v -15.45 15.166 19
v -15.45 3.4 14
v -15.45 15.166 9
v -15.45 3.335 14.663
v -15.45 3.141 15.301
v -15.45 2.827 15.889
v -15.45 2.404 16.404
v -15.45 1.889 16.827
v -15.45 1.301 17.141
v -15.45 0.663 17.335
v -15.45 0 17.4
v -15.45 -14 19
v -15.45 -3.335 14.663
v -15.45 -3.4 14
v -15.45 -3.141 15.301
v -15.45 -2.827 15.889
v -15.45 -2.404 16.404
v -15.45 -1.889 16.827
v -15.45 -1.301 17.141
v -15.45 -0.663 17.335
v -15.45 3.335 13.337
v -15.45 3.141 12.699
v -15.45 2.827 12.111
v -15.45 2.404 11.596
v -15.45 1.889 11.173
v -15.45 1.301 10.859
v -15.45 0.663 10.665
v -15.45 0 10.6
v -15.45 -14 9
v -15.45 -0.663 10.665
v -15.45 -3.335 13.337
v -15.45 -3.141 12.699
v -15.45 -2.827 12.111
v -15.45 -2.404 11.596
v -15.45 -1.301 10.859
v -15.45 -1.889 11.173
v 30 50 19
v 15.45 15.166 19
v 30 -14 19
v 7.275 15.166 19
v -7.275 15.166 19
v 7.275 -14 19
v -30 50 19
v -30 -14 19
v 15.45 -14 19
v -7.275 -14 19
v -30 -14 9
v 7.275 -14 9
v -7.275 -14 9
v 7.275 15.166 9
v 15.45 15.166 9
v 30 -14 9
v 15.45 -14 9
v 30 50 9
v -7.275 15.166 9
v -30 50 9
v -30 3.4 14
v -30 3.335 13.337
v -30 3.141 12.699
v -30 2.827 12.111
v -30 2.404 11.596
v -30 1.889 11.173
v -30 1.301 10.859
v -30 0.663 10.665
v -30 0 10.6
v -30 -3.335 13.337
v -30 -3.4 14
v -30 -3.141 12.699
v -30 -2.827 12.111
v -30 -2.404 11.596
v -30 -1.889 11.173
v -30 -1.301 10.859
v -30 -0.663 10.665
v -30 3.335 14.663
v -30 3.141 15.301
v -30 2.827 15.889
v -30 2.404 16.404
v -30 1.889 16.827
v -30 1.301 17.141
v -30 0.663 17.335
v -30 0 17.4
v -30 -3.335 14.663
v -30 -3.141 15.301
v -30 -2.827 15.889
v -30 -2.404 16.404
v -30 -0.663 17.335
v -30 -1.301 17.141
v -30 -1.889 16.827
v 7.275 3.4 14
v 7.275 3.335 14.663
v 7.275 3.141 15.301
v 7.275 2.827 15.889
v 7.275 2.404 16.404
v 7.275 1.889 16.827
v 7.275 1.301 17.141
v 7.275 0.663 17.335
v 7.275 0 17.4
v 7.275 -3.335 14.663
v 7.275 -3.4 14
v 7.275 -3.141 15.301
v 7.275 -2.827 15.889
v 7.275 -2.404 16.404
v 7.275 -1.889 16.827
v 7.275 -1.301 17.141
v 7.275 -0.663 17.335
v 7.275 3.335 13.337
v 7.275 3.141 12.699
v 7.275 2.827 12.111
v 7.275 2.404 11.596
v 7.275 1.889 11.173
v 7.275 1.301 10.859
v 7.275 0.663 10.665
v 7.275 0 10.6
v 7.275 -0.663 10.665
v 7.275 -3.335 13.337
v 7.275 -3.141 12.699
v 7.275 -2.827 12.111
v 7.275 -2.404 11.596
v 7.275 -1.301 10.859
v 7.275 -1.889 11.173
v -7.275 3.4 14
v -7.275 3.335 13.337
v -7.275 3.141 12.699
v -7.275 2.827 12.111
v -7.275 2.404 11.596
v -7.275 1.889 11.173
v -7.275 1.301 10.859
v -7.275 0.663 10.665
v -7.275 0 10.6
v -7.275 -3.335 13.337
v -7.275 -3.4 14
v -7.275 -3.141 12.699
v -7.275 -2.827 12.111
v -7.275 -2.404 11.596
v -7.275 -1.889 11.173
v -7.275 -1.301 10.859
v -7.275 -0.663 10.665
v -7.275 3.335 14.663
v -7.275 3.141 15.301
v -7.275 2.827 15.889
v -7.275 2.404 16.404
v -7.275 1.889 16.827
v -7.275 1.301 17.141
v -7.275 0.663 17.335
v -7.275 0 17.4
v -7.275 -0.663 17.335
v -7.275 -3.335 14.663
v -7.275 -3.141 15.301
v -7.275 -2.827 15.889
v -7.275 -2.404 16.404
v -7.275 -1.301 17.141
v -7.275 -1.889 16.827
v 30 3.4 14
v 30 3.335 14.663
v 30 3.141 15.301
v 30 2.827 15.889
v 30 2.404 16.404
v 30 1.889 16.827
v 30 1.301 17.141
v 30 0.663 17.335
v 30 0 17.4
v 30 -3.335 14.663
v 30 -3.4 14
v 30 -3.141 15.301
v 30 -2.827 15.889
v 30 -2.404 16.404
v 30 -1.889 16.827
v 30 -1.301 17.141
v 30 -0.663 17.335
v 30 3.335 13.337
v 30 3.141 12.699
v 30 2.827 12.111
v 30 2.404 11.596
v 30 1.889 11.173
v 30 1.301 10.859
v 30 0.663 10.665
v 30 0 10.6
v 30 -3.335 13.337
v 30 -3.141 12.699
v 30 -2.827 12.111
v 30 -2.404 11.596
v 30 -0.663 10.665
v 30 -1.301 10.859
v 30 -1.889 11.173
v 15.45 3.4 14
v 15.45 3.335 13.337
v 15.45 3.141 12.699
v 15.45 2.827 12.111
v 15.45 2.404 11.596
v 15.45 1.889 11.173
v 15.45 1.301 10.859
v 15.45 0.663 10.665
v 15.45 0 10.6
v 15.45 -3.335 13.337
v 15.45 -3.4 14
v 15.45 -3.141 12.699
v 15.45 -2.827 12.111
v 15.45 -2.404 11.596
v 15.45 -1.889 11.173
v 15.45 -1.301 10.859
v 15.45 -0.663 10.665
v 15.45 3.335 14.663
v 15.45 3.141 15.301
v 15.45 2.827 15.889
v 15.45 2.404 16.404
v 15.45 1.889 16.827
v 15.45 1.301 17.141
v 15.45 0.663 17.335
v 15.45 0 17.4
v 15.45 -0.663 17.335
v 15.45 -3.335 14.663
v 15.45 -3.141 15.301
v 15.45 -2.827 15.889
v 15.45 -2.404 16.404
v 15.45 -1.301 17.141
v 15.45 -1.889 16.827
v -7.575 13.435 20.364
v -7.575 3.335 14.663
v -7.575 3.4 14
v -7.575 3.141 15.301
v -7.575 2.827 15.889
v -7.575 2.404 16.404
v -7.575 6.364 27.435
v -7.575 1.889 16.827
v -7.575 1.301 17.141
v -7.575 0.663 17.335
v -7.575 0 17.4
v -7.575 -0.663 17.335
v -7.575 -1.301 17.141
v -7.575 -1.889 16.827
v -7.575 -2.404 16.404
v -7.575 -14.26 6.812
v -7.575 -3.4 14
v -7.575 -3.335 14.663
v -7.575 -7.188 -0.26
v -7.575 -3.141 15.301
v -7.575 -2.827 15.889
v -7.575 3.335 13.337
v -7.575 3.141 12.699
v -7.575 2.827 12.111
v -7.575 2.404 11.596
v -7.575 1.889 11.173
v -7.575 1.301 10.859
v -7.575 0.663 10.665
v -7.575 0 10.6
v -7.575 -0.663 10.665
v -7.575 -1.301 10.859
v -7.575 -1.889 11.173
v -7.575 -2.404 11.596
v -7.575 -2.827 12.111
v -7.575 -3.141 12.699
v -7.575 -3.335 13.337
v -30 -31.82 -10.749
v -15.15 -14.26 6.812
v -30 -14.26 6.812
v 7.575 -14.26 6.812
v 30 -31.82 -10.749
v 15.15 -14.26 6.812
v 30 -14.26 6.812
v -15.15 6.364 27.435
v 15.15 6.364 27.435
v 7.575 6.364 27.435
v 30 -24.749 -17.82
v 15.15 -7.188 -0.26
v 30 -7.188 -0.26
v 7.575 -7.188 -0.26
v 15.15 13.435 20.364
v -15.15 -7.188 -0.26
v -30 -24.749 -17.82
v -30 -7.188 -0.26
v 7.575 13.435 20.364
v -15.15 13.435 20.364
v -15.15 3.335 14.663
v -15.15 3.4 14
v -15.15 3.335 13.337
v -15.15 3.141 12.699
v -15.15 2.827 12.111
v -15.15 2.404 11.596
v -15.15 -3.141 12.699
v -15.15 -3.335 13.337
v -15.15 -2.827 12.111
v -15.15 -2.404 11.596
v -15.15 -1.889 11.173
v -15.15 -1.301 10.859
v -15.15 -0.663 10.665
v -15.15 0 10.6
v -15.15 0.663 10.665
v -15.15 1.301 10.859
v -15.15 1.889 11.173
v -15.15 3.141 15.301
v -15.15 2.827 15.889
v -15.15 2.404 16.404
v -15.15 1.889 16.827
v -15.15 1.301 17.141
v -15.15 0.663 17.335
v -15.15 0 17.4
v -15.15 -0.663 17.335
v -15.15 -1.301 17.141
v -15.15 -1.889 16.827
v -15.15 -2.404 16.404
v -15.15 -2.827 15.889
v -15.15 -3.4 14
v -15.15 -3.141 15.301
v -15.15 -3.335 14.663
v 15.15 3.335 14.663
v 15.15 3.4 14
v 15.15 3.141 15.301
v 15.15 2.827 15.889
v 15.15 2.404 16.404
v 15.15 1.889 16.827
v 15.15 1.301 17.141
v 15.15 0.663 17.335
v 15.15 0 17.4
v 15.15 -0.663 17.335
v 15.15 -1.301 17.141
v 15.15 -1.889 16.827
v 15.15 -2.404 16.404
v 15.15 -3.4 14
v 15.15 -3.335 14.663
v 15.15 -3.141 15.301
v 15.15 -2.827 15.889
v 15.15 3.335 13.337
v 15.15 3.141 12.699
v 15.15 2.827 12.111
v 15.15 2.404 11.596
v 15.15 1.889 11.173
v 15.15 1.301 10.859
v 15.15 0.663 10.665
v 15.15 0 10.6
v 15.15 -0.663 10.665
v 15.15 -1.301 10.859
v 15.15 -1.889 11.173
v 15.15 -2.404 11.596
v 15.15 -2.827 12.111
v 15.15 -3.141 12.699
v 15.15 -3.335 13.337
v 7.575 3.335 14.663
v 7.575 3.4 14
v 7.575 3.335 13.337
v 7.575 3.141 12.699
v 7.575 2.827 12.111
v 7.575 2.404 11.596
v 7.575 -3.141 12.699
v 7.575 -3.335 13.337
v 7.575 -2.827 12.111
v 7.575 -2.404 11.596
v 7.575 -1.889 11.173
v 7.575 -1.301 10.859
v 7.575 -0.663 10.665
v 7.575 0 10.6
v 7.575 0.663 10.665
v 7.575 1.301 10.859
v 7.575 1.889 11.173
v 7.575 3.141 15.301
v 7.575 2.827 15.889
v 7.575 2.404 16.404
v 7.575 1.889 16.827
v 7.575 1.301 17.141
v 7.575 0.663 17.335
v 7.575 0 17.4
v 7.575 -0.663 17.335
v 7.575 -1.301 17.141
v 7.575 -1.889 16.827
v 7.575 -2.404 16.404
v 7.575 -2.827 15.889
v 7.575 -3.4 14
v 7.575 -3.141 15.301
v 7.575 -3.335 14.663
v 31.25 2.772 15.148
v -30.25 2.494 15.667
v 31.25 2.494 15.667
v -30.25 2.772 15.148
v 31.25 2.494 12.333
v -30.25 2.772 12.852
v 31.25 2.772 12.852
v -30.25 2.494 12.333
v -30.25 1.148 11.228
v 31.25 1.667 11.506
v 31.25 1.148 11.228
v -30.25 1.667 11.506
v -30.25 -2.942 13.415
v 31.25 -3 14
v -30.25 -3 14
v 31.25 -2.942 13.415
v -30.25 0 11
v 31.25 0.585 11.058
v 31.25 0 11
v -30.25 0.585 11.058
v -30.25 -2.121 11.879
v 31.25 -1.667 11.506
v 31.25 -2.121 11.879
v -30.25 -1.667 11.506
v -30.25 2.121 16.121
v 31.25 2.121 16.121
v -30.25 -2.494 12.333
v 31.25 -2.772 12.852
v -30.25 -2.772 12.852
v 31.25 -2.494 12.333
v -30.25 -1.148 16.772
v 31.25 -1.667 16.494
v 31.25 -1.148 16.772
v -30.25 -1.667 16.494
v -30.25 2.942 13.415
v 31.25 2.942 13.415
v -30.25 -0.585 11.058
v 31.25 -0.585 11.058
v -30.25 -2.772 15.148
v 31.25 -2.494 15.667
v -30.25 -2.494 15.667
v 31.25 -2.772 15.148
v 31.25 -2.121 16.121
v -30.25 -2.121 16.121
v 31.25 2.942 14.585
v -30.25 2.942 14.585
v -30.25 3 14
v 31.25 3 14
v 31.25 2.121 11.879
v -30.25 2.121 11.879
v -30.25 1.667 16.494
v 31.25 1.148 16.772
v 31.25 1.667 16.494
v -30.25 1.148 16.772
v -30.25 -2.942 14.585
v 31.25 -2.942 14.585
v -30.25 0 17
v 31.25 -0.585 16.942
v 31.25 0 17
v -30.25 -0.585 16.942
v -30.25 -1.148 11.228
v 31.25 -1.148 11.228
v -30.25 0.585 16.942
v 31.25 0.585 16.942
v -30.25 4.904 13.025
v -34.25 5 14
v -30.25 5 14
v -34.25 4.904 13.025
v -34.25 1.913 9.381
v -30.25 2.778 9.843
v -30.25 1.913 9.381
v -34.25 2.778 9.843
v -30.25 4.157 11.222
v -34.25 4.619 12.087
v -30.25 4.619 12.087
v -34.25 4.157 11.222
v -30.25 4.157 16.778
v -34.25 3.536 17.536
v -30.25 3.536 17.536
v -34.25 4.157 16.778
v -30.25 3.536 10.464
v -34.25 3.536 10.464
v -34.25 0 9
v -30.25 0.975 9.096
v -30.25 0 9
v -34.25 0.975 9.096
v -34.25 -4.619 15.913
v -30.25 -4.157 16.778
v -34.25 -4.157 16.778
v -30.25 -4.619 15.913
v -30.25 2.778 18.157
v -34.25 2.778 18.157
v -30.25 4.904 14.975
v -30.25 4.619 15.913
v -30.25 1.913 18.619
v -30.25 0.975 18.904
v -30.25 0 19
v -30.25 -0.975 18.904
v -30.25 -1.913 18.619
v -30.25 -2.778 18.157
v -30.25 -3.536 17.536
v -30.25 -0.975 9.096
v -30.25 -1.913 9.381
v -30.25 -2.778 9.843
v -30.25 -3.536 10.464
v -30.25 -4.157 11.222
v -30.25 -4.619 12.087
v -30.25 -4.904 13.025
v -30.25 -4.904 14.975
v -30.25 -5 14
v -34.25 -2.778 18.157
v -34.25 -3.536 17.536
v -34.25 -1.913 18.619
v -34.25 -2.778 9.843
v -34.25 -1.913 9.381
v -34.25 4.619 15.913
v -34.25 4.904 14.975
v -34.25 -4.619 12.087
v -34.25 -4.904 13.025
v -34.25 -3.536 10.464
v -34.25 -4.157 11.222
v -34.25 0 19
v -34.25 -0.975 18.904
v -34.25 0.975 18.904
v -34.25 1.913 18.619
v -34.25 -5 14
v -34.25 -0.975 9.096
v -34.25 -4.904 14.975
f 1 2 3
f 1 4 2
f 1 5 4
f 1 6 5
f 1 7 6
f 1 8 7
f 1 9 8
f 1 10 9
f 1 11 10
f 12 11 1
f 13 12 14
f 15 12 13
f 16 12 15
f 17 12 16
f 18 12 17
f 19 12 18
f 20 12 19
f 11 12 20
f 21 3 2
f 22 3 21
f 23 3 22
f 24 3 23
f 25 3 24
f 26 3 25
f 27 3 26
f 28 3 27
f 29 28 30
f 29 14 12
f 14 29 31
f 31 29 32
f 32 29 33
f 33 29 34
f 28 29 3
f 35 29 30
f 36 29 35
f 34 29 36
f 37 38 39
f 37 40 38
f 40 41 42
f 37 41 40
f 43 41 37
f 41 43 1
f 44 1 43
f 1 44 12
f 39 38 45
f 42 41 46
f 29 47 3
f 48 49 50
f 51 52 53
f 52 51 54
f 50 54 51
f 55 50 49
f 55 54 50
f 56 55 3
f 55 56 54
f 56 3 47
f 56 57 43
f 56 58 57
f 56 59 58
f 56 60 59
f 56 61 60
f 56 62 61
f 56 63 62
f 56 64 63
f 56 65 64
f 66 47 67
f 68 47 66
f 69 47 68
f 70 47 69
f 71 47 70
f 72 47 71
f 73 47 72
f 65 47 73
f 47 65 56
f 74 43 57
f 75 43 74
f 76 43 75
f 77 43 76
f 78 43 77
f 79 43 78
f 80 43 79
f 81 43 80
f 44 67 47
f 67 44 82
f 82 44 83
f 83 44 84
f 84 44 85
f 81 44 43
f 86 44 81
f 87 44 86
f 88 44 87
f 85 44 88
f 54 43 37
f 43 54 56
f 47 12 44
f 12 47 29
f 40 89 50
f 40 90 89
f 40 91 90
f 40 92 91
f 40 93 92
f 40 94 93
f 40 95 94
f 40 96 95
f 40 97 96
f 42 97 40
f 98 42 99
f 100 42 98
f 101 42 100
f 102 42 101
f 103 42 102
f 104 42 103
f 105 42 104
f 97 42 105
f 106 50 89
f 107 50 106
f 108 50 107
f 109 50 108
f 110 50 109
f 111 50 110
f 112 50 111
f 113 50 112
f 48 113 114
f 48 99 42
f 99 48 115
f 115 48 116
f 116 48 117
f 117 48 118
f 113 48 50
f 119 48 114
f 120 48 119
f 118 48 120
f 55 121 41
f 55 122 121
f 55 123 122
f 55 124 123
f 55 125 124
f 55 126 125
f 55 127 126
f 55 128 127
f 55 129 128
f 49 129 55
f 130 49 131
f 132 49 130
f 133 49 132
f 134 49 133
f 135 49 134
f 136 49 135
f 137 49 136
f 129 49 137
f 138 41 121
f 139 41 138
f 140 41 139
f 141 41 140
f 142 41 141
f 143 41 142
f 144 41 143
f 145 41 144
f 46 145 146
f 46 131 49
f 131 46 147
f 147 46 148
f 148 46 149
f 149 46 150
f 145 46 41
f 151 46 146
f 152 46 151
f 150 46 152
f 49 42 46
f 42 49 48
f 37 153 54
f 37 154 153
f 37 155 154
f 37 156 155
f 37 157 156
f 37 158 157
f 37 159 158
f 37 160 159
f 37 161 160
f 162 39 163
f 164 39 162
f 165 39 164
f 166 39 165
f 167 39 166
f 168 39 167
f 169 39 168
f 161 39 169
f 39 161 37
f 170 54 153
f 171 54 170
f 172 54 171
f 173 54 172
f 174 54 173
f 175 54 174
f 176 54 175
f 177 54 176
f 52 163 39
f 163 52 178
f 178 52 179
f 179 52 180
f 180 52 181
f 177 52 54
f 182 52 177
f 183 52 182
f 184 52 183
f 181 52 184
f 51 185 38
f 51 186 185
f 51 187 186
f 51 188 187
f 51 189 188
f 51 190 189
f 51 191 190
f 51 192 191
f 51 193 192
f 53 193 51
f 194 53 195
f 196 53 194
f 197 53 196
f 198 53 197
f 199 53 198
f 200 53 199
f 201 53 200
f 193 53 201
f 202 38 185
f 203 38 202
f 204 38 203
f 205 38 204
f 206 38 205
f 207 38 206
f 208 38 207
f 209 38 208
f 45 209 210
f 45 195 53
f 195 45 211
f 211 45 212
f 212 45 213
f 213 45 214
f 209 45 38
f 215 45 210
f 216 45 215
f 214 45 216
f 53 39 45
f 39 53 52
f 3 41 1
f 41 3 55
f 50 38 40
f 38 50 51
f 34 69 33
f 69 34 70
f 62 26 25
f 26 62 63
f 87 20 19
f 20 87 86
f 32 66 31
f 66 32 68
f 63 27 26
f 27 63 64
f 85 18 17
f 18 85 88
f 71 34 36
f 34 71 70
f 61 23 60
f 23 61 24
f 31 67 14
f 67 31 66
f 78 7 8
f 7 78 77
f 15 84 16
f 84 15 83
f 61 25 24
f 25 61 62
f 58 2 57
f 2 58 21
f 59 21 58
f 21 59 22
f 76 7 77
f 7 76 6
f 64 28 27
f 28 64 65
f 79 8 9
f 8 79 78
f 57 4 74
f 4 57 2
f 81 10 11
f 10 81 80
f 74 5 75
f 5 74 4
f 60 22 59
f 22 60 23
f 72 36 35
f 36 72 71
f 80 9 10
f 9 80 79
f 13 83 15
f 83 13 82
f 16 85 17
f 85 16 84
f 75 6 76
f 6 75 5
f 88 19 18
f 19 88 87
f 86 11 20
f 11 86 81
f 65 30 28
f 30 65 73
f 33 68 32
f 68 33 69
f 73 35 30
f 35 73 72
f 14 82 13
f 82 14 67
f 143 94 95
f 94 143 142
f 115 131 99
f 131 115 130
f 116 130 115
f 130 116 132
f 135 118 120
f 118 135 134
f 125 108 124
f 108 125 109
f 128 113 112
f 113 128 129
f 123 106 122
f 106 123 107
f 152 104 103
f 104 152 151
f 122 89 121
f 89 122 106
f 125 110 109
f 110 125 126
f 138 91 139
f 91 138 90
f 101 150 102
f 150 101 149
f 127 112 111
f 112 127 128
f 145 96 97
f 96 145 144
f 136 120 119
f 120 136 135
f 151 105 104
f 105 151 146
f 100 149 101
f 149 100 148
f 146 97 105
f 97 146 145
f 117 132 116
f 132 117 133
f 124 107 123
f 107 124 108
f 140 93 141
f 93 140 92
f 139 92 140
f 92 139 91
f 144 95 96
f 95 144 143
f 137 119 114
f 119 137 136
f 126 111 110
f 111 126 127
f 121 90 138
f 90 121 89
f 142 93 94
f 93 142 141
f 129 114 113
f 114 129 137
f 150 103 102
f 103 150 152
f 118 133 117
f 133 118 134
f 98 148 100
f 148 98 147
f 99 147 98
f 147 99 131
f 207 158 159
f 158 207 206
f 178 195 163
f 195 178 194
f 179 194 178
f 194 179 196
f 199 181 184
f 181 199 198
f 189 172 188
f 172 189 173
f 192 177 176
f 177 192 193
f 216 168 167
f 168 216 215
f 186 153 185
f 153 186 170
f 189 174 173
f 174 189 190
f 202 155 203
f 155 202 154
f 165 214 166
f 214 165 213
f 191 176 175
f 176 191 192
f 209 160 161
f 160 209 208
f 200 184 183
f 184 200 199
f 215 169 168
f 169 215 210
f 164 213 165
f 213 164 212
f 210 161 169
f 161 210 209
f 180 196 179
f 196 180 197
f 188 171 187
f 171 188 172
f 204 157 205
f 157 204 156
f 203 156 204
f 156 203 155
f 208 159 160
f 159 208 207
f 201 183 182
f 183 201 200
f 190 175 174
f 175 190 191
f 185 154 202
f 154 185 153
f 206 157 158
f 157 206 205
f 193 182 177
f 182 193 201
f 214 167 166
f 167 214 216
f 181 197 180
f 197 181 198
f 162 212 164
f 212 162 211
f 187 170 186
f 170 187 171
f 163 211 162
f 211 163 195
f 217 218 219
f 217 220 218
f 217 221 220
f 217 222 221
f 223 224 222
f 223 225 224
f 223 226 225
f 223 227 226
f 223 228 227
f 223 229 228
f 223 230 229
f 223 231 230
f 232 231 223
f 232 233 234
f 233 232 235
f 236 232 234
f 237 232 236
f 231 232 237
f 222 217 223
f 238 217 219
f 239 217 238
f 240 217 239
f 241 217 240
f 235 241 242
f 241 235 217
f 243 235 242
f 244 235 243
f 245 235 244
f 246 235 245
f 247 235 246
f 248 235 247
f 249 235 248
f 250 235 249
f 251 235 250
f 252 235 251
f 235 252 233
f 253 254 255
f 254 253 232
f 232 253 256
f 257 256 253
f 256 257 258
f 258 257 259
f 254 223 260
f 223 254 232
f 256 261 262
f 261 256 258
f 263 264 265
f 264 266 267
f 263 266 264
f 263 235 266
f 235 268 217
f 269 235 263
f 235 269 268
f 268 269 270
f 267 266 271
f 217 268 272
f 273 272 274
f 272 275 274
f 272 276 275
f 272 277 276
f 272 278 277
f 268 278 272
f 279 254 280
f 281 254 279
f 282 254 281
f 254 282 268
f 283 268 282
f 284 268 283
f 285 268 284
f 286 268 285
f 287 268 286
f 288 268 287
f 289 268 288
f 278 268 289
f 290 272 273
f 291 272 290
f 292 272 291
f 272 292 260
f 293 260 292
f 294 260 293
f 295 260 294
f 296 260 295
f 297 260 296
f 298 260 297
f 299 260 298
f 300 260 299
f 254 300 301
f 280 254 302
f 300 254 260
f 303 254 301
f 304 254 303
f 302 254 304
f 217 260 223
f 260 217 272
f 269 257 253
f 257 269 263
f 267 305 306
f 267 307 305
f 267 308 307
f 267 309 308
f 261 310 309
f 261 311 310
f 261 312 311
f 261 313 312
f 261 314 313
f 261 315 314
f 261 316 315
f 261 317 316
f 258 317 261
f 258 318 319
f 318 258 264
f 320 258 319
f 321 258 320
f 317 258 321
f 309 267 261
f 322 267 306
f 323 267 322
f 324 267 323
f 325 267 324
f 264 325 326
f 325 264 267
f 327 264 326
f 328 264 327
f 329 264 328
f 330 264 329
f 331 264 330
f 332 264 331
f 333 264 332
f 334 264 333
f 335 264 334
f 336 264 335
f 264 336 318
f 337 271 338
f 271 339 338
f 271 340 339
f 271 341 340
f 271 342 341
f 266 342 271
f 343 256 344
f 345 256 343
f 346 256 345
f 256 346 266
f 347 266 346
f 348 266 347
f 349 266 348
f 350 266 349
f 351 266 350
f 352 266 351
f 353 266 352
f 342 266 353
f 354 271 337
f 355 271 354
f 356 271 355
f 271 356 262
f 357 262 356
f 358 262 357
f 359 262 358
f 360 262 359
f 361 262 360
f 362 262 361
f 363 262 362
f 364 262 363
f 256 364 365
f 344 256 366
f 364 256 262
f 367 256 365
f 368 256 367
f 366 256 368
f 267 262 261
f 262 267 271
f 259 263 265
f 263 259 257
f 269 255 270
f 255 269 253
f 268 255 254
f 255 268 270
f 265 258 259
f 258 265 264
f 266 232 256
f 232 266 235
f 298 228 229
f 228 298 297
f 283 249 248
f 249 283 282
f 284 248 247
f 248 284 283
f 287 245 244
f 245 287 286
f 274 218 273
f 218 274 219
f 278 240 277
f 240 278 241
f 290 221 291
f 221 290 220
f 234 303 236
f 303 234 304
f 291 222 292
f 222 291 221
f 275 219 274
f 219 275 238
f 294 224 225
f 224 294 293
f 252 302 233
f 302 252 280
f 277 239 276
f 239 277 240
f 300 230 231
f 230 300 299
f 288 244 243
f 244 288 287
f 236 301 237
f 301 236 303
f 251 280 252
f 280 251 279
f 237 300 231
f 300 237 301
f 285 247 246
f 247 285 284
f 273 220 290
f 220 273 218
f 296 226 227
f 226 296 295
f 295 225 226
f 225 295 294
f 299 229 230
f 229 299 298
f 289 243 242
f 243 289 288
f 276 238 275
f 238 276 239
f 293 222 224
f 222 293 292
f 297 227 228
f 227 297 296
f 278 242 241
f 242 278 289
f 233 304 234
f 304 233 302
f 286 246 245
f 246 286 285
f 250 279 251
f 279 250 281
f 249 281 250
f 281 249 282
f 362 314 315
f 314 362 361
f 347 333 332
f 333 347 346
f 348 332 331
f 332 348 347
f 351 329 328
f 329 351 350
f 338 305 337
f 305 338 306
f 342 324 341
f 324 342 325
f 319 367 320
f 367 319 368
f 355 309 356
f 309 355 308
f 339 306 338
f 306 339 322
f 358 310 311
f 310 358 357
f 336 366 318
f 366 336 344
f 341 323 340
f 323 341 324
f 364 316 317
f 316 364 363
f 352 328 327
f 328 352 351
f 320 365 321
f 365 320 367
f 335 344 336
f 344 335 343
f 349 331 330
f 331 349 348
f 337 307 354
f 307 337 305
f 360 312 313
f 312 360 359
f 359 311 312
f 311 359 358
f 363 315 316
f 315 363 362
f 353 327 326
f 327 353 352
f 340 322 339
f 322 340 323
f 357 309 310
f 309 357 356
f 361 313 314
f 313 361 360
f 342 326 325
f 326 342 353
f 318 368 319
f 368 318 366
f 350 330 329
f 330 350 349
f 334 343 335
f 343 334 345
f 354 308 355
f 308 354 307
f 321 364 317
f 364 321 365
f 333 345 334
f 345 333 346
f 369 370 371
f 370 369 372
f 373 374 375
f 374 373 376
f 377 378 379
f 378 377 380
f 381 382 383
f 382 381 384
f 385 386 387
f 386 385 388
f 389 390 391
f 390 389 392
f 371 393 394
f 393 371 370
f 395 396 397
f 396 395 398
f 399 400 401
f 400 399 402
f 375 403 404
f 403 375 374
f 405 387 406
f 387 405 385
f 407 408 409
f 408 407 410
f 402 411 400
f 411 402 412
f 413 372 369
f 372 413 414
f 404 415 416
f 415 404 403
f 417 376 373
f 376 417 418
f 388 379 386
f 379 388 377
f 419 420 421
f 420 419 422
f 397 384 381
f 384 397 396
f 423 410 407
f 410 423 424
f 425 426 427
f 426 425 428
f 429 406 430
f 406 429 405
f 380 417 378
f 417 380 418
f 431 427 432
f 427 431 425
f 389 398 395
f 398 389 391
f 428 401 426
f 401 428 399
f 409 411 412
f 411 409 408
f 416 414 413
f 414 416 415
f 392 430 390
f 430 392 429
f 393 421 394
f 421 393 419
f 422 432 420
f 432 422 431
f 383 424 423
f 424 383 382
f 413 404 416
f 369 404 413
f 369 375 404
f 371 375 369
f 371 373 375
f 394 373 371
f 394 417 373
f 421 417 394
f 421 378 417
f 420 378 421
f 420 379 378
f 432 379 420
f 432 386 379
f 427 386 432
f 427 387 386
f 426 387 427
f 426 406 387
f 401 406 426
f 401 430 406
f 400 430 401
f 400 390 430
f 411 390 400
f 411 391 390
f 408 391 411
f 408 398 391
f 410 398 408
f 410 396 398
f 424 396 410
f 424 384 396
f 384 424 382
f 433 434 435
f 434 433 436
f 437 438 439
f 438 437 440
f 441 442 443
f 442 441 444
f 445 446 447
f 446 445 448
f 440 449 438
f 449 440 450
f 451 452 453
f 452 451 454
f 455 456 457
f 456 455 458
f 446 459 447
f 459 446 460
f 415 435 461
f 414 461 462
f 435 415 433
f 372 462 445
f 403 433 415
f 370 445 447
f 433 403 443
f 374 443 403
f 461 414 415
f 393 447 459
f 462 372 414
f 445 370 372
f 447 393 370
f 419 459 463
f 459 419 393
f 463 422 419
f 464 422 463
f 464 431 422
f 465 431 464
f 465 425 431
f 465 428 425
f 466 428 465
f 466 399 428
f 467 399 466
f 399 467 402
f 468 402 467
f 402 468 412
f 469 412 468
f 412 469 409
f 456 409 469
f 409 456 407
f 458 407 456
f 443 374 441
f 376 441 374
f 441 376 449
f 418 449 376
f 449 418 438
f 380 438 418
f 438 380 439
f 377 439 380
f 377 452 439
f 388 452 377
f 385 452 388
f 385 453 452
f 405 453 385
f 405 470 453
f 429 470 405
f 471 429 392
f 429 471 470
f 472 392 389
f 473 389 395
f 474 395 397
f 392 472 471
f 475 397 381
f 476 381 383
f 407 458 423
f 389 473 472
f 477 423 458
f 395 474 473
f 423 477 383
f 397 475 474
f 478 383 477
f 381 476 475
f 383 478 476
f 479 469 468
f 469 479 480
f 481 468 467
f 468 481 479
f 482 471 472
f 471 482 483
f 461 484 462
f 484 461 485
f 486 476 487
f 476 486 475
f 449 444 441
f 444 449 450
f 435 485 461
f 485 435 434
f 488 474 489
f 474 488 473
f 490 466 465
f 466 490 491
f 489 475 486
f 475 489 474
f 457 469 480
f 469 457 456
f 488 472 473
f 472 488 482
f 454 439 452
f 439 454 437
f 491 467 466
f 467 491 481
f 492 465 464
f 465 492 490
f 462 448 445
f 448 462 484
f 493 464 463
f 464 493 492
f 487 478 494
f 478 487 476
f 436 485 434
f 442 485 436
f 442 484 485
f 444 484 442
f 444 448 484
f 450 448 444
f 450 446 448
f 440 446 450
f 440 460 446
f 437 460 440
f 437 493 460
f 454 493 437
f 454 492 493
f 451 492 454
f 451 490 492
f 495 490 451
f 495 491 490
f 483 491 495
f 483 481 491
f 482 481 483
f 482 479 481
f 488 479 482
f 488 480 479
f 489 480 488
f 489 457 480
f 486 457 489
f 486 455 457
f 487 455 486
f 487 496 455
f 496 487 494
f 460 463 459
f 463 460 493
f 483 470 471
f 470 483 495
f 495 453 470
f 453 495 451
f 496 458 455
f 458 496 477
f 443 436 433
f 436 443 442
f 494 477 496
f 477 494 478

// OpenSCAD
$fn = 32;

// ------------------------------------------------------------------------
// Butt hinge: hinge 60 mm, leaf swung 45 deg
// Every part is its own module, assembly() places every instance.
// ------------------------------------------------------------------------

// --- part 1 ---
module hinge_base() {
  difference() {
    union() {
      translate([-30, -14, -5]) cube([14.55, 64, 10]);
      translate([-7.275, -14, -5]) cube([14.55, 64, 10]);
      translate([15.45, -14, -5]) cube([14.55, 64, 10]);
      translate([-30, 15.166, -5]) cube([60, 34.834, 10]);
    }
    translate([-22.725, 0, 0]) rotate([0, 90, 0]) cylinder(h = 16.55, d = 6.8, center = true);
    translate([0, 0, 0]) rotate([0, 90, 0]) cylinder(h = 16.55, d = 6.8, center = true);
    translate([22.725, 0, 0]) rotate([0, 90, 0]) cylinder(h = 16.55, d = 6.8, center = true);
  }
}

// --- part 2 ---
module hinge_mover() {
  difference() {
    union() {
      translate([-15.15, -40, -5]) cube([7.575, 54, 10]);
      translate([7.575, -40, -5]) cube([7.575, 54, 10]);
      translate([-30, -40, -5]) cube([60, 24.834, 10]);
    }
    translate([-11.362, 0, 0]) rotate([0, 90, 0]) cylinder(h = 9.575, d = 6.8, center = true);
    translate([11.362, 0, 0]) rotate([0, 90, 0]) cylinder(h = 9.575, d = 6.8, center = true);
  }
}

// --- part 3 ---
module hinge_pin() {
  rotate([0, 90, 0]) cylinder(h = 62.5, d = 6, center = true);
  translate([-34.25, 0, 0]) rotate([0, 90, 0]) cylinder(h = 4, d = 10);
}

// --- assembly ---
module assembly() {
  color([0.80, 0.24, 0.20]) translate([0, 0, 14]) rotate([0, 0, 0]) hinge_base();
  color([0.20, 0.45, 0.75]) translate([0, 0, 14]) rotate([45, 0, 0]) hinge_mover();
  color([0.25, 0.62, 0.32]) translate([0, 0, 14]) rotate([0, 0, 0]) hinge_pin();
}

assembly();
